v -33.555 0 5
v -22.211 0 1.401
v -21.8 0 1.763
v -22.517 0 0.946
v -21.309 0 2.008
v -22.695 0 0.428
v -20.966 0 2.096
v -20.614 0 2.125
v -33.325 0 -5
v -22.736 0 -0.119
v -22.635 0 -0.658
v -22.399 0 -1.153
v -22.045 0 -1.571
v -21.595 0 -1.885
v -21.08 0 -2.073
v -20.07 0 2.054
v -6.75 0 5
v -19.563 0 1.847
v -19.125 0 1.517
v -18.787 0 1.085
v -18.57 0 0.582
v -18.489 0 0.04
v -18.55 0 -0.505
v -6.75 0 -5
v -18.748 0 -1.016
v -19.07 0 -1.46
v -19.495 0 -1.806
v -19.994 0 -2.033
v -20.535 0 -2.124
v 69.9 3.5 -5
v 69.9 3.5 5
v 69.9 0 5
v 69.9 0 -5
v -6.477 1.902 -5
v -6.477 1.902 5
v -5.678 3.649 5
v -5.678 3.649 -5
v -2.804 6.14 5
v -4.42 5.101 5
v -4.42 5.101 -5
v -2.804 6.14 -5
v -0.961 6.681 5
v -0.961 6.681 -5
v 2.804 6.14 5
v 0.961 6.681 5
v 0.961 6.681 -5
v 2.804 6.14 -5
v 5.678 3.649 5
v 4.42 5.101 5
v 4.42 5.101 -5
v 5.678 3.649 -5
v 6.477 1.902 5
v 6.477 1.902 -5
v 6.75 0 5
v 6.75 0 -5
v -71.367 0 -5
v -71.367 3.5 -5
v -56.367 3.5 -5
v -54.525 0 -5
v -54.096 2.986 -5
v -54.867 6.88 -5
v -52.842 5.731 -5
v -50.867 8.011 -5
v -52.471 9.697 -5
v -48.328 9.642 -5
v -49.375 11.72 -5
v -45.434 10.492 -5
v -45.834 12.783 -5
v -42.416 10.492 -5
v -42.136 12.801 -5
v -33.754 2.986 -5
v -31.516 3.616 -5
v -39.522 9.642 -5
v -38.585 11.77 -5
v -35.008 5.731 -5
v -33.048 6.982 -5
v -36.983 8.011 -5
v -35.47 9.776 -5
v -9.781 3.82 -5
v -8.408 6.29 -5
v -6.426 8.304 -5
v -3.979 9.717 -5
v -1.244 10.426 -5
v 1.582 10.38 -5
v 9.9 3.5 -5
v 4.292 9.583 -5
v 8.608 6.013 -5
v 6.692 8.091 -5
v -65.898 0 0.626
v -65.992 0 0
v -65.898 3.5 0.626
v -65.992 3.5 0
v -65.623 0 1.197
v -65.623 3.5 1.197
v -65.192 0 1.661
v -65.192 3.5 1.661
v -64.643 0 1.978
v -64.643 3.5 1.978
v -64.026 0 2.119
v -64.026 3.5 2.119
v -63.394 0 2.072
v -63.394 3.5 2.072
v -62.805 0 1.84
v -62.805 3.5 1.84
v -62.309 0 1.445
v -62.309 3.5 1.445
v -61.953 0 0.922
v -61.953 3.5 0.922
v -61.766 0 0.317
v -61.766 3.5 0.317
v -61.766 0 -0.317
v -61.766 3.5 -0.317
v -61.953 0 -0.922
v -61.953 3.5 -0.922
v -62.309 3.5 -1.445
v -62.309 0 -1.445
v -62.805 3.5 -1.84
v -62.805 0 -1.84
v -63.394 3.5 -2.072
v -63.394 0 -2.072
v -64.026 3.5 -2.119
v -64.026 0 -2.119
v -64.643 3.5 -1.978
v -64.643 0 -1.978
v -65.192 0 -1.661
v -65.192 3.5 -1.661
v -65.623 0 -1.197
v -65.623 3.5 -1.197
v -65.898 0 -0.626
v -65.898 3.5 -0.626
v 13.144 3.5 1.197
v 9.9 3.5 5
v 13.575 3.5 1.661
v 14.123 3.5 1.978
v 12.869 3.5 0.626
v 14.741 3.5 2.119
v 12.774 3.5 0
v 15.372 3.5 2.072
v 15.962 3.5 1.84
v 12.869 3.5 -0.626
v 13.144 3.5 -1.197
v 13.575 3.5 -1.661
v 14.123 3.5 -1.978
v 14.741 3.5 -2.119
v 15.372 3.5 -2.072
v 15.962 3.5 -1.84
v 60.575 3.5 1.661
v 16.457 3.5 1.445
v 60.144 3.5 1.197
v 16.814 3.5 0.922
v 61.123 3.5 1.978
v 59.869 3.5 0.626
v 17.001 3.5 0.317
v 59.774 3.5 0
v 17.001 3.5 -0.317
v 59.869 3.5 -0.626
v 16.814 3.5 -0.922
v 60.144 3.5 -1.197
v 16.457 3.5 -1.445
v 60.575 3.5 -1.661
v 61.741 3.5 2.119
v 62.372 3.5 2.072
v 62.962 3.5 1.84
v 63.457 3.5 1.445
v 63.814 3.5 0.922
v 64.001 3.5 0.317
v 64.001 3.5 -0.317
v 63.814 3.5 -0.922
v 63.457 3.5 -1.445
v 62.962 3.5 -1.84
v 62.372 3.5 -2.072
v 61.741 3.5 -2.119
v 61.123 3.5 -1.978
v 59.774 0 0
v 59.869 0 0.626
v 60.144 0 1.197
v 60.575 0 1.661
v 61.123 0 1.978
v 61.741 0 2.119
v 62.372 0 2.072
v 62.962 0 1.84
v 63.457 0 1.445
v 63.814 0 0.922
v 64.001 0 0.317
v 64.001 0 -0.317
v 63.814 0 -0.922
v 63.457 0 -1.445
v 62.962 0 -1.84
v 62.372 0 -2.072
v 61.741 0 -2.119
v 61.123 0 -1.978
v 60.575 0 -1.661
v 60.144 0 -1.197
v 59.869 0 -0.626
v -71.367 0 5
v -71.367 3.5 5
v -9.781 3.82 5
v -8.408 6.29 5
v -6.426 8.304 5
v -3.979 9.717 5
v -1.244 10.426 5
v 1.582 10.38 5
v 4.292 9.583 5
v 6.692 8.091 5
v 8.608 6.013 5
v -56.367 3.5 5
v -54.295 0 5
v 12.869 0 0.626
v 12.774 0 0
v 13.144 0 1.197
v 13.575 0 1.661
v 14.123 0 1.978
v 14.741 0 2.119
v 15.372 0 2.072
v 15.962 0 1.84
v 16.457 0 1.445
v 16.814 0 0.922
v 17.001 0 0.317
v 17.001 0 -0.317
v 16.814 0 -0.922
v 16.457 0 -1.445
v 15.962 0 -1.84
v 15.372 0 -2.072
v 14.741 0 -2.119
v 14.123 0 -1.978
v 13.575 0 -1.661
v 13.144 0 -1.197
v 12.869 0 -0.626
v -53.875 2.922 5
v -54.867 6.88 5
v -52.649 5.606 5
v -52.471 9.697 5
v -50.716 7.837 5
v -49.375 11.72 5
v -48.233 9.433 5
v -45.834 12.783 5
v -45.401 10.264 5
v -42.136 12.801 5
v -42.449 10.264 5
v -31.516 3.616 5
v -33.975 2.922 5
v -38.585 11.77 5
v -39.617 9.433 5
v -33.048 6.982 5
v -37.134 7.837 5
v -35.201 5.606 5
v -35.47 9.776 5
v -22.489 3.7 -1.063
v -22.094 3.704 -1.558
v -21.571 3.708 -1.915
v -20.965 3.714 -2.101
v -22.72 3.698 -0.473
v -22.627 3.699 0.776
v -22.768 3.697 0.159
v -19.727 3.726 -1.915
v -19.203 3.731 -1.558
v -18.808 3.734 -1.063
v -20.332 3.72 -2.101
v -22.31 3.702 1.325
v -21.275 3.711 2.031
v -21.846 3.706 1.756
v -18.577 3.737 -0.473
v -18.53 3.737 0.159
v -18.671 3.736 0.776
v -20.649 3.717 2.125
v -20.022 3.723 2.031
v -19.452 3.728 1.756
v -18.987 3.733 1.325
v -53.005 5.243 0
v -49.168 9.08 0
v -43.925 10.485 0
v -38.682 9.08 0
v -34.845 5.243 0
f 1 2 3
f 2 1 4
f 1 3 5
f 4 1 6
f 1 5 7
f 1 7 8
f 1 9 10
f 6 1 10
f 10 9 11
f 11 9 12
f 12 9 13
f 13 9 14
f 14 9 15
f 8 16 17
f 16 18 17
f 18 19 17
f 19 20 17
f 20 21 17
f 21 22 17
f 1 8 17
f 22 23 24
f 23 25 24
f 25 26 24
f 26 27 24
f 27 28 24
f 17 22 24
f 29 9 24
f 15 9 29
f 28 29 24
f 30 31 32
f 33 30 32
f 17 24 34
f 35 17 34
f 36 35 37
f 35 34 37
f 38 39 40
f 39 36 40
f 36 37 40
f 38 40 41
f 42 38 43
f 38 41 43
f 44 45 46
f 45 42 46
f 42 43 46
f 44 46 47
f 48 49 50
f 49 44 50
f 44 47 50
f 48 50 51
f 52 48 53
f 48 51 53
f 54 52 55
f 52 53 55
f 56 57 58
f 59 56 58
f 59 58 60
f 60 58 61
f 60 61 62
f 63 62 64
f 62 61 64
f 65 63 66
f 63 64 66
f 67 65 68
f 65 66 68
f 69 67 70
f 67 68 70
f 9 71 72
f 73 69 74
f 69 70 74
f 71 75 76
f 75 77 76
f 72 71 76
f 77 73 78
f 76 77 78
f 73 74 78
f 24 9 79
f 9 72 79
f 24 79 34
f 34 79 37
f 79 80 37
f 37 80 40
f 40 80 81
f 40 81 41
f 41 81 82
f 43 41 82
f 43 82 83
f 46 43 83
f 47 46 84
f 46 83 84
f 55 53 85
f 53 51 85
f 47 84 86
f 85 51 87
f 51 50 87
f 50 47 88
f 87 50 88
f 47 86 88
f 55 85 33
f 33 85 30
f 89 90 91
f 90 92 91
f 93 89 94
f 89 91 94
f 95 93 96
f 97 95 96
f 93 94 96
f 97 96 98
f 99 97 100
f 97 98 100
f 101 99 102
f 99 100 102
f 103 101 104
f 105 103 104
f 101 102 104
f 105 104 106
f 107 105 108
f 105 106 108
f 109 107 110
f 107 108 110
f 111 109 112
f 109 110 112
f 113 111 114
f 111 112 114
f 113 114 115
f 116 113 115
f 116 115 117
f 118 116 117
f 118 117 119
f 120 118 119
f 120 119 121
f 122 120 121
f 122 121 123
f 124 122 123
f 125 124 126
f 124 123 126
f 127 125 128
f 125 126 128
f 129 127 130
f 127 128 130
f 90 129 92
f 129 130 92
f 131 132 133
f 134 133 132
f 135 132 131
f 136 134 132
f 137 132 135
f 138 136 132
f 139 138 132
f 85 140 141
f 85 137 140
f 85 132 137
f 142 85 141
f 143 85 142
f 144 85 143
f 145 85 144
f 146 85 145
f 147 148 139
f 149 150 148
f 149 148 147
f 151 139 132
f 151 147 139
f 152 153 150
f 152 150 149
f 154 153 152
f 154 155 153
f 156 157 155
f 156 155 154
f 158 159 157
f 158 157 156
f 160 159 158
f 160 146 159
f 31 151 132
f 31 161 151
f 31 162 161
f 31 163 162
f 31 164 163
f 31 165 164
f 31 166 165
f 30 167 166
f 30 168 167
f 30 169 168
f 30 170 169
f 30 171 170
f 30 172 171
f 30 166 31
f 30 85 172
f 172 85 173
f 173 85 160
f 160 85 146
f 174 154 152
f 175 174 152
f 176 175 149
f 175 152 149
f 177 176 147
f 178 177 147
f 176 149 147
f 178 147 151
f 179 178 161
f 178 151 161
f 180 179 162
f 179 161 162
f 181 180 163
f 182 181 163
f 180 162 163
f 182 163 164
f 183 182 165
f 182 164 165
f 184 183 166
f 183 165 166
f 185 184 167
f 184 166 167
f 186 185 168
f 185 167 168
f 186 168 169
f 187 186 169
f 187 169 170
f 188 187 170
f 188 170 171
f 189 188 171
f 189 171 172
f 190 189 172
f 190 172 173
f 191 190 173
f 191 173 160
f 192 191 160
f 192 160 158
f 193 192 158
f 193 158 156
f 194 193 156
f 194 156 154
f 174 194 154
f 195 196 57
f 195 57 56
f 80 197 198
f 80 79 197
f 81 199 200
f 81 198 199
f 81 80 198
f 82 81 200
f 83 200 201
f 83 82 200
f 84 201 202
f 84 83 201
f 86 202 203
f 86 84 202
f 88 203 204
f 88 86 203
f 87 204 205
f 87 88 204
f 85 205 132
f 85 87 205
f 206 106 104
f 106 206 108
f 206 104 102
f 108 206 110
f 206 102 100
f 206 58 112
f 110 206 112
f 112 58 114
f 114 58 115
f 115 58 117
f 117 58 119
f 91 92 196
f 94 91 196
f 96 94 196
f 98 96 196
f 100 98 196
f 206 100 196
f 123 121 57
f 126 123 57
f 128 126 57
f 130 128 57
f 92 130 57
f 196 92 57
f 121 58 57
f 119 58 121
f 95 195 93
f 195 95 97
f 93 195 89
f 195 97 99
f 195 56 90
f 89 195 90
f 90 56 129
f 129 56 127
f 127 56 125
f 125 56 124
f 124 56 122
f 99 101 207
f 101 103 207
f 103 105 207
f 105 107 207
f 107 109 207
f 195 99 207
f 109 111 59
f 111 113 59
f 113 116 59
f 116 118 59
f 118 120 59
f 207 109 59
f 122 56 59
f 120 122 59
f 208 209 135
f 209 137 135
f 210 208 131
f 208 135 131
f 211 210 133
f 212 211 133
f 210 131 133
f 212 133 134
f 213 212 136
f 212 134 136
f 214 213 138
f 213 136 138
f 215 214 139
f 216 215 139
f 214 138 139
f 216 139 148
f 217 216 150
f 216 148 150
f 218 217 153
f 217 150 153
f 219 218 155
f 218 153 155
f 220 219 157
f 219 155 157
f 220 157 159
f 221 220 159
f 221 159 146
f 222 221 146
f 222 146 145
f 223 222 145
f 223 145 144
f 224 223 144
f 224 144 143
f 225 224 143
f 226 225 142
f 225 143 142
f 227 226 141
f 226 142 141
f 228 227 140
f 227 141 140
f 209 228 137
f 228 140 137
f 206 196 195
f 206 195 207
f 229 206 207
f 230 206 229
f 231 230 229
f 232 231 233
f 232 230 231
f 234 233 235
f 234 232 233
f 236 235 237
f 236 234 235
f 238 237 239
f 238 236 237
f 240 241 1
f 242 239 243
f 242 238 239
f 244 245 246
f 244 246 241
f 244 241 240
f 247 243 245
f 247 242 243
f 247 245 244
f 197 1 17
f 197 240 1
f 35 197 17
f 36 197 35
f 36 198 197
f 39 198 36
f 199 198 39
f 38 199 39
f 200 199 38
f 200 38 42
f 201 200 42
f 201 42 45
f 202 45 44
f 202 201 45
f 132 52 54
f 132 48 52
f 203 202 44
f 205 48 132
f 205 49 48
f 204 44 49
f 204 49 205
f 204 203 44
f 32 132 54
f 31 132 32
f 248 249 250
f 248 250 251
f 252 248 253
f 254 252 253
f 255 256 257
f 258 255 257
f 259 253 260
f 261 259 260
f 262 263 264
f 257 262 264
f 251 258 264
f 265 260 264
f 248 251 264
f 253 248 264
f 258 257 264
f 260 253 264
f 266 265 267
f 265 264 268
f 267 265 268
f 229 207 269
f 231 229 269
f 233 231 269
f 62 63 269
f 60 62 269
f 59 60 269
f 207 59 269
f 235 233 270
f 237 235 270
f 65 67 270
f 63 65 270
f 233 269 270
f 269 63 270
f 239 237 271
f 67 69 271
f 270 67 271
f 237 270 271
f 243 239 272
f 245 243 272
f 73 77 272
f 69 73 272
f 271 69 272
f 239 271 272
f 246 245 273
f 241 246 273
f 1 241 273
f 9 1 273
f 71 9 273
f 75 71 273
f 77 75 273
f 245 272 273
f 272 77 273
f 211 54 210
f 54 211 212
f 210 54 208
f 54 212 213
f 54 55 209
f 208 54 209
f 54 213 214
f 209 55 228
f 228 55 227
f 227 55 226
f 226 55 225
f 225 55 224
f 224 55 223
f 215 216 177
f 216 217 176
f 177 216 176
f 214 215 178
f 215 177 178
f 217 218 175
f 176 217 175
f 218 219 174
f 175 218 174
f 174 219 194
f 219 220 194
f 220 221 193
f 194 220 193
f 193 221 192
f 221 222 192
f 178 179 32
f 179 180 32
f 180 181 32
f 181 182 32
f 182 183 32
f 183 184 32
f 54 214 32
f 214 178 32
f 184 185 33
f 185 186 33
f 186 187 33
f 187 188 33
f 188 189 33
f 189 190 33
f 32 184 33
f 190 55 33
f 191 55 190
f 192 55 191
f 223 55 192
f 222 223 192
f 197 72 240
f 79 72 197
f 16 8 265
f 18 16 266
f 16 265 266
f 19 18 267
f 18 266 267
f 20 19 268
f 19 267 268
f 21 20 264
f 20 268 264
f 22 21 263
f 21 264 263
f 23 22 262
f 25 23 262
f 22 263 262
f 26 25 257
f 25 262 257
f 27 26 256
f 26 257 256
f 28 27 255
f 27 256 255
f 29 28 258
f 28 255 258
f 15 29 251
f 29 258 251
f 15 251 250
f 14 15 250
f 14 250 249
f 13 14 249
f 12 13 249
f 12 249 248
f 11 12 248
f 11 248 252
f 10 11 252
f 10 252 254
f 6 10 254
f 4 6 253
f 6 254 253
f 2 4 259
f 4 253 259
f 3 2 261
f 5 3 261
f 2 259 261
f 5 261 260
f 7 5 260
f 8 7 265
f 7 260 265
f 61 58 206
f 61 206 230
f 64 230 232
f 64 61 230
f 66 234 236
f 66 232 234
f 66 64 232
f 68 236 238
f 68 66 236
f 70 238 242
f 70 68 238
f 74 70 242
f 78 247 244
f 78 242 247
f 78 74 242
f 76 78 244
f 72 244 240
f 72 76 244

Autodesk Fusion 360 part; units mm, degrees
sketch "Sketch1" plane through (0, 0, 0) normal (0, 0, 1) x (1, 0, 0)
  circle A0 centre (-43.925, 0) radius 12.925
  circle A1 centre (0, 0) radius 10.5
  circle A2 centre (0, 0) radius 6.75
  line L0 (9.8995, 3.5) -> (69.8995, 3.5)
  line L1 (69.8995, 3.5) -> (69.8995, -3.5)
  line L2 (69.8995, -3.5) -> (9.8995, -3.5)
  line L3 (-31.5162, 3.6163) -> (-9.7806, 3.8197)
  line L4 (-31.4507, -3.3834) -> (-10.006, -3.1827)
  line L5 (-56.3671, 3.5) -> (-71.3671, 3.5)
  line L6 (-71.3671, 3.5) -> (-71.3671, -3.5)
  line L7 (-71.3671, -3.5) -> (-56.3671, -3.5)
  line L8 (-43.925, 0) -> (0, 0) construction
  dimension "d1" = 3.5
  dimension "d2" = 3.5
  dimension "d3" = 3.5
  dimension "d4" = 3.5
  dimension "d5" = 3.5
  dimension "d6" = 3.5
  dimension "d7" = 43.925
  dimension "d8" = 60
  dimension "d9" = 15
  dimension "d19" = 25.85
  dimension "d20" = 21
  dimension "d21" = 13.5
extrude "Extrude1" add sketch "Sketch1" along normal mid plane 10
sketch "Sketch4" plane through (0, 3.5, 0) normal (0, 1, 0) x (-1, 0, 0)
  line L0 (71.3671, -5) -> (71.3671, 5)
  line L1 (71.3671, 5) -> (56.3671, 5)
  line L2 (56.3671, 5) -> (56.3671, -5)
  line L3 (56.3671, -5) -> (71.3671, -5)
  circle A0 centre (63.8671, 0) radius 2.125
  line L4 (31.5162, -5) -> (9.7806, -5)
  line L5 (31.5162, 5) -> (31.5162, -5)
  line L6 (9.7806, -5) -> (9.7806, 5)
  dimension "d25" = 4.25
  dimension "d27" = 5
  dimension "d31" = 7.5
  dimension "d32" = 7.5
extrude "Extrude4" cut sketch "Sketch4" along normal up to surface contours A0 end surface through (-31.4507, -3.3834, 0) normal (0.009359, -0.999956, 0) offset 0
sketch "Sketch5" plane through (-0.0366, 3.9109, 0) normal (-0.0094, 1, 0) x (0, 0, 1)
  line L0 (-5, -31.481) -> (5, -31.481)
  line L1 (5, -31.481) -> (5, -9.7444)
  line L2 (5, -9.7444) -> (-5, -9.7444)
  line L3 (-5, -9.7444) -> (-5, -31.481)
  circle A0 centre (0, -20.613) radius 2.125
  dimension "d35" = 4.25
  dimension "d36" = 10.868
  dimension "d37" = 10.8686
  dimension "d38" = 5
extrude "Extrude5" cut sketch "Sketch5" against normal up to surface (7 mm away) contours A0
sketch "Sketch6" plane through (0, 3.5, 0) normal (0, 1, 0) x (-1, 0, 0)
  line L0 (-9.8995, -5) -> (-9.8995, 5)
  line L1 (-9.8995, 5) -> (-69.8995, 5)
  line L2 (-69.8995, 5) -> (-69.8995, -5)
  line L3 (-69.8995, -5) -> (-9.8995, -5)
sketch "Sketch7" plane through (0, 3.5, 0) normal (0, 1, 0) x (-1, 0, 0)
  line L0 (-9.8995, -5) -> (-9.8995, 5) construction
  line L1 (-9.8995, 5) -> (-69.8995, 5) construction
  line L2 (-69.8995, 5) -> (-69.8995, -5) construction
  line L3 (-69.8995, -5) -> (-9.8995, -5) construction
  line L4 (-69.8995, 0) -> (-9.8995, 0) construction
  circle A0 centre (-61.8995, 0) radius 2.125
  circle A1 centre (-14.8995, 0) radius 2.125
  dimension "d41" = 4.25
  dimension "d42" = 4.25
  dimension "d43" = 8
  dimension "d44" = 5
extrude "Extrude6" cut sketch "Sketch7" against normal up to surface (7 mm away)
sketch "Sketch8" plane through (0, 0, 5) normal (0, 0, 1) x (1, 0, 0)
  circle A0 centre (0, 0) radius 6.75
  arc A1 (-31.5162, 3.6163) -> (-56.3671, 3.5) centre (-43.925, 0) ccw
  line L0 (-56.3671, 3.5) -> (-71.3671, 3.5)
  line L1 (-71.3671, 3.5) -> (-71.3671, -3.5)
  line L2 (-71.3671, -3.5) -> (-56.3671, -3.5)
  arc A2 (-56.3671, -3.5) -> (-31.4507, -3.3834) centre (-43.925, 0) ccw
  line L3 (-31.4507, -3.3834) -> (-10.006, -3.1827)
  arc A3 (-10.006, -3.1827) -> (9.8995, -3.5) centre (0, 0) ccw
  line L4 (9.8995, -3.5) -> (69.8995, -3.5)
  line L5 (69.8995, -3.5) -> (69.8995, 3.5)
  line L6 (69.8995, 3.5) -> (9.8995, 3.5)
  arc A4 (9.8995, 3.5) -> (-9.7806, 3.8197) centre (0, 0) ccw
  line L7 (-9.7806, 3.8197) -> (-31.5162, 3.6163)
  circle A5 centre (-43.925, 0) radius 12.925 construction
  circle A6 centre (-43.925, 0) radius 10.37
  dimension "d49" = 20.74
sketch "Sketch9" plane through (0, 0, -5) normal (0, 0, -1) x (-1, 0, 0)
  circle A0 centre (0, 0) radius 6.75
  arc A1 (56.3671, 3.5) -> (31.5162, 3.6163) centre (43.925, 0) ccw
  line L0 (31.5162, 3.6163) -> (9.7806, 3.8197)
  arc A2 (9.7806, 3.8197) -> (-9.8995, 3.5) centre (0, 0) ccw
  line L1 (-9.8995, 3.5) -> (-69.8995, 3.5)
  line L2 (-69.8995, 3.5) -> (-69.8995, -3.5)
  line L3 (-69.8995, -3.5) -> (-9.8995, -3.5)
  arc A3 (-9.8995, -3.5) -> (10.006, -3.1827) centre (0, 0) ccw
  line L4 (10.006, -3.1827) -> (31.4507, -3.3834)
  arc A4 (31.4507, -3.3834) -> (56.3671, -3.5) centre (43.925, 0) ccw
  line L5 (56.3671, -3.5) -> (71.3671, -3.5)
  line L6 (71.3671, -3.5) -> (71.3671, 3.5)
  line L7 (71.3671, 3.5) -> (56.3671, 3.5)
  circle A5 centre (43.925, 0) radius 12.925 construction
  circle A6 centre (43.925, 0) radius 10.6
  dimension "d50" = 21.2
loft "Loft1" cut profiles "Sketch8", "Sketch9" section 1 contours A6 section 2 contours A6
sketch "Sketch3" plane through (0, 0, 0) normal (0, 1, 0) x (1, 0, 0)
  line L0 (-71.3671, 5) -> (-71.3671, -5)
  line L1 (-71.3671, -5) -> (-56.3671, -5)
  line L2 (-56.3671, -5) -> (-56.3671, 5)
  line L3 (-56.3671, 5) -> (-71.3671, 5)
  line L4 (9.8995, 5) -> (9.8995, -5)
  line L5 (9.8995, -5) -> (69.8995, -5)
  line L6 (69.8995, -5) -> (69.8995, 5)
  line L7 (69.8995, 5) -> (9.8995, 5)
  line L8 (-71.3671, 5) -> (69.8995, 5)
  line L9 (69.8995, 5) -> (69.8995, -5)
  line L10 (69.8995, -5) -> (-71.3671, -5)
  line L11 (-71.3671, -5) -> (-71.3671, 5)
  circle A0 centre (-63.8671, 0) radius 2.125
  circle A1 centre (14.8995, 0) radius 2.125
  circle A2 centre (61.8995, 0) radius 2.125
extrude "Extrude3" cut sketch "Sketch3" against normal blind 20 contours L0 L1 L2 L3 L8 L10 L11 | L2 L4 L8 L10 | L4 L5 L6 L7 L8 L9 L10 | A0 | A1 | A2
equation "d2 = d1"
equation "d3 = d1"
equation "d4 = d1"
equation "d5 = d1"
equation "d6 = d1"
equation "d42 = d41"
